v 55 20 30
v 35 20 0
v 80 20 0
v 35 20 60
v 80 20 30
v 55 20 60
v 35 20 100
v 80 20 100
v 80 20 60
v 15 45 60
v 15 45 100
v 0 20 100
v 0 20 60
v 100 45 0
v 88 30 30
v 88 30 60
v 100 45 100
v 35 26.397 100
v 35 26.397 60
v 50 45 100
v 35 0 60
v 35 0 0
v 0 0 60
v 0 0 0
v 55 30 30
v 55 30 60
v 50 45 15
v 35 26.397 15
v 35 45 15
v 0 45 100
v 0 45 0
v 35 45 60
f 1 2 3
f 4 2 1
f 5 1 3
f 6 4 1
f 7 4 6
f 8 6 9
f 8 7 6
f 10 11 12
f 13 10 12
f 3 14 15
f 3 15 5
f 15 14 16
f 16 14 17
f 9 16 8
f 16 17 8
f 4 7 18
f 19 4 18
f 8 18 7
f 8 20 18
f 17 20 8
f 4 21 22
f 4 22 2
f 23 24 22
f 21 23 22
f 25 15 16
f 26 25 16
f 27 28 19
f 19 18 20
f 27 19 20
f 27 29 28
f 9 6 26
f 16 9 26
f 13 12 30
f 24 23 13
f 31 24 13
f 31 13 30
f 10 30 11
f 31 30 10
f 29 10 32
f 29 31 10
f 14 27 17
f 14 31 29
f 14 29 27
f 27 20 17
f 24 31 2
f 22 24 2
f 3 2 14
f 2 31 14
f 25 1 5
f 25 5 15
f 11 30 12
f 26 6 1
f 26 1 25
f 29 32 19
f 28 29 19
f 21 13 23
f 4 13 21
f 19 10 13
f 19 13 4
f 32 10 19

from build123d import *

# Parameters (mm, degrees)
F0_W      = 100
F0_H      = 45
F1_DEPTH  = 100
F2_W      = 65
F2_H      = 20
F3_DEPTH  = 100.001
F6_DEPTH  = 40
F7_W      = 10
F7_H      = 30
F8_DEPTH  = 45
F10_DEPTH = 100.001
F13_DEPTH = 85


with BuildPart() as f1:
    # F0 (on Top) → F1 (new body)
    with BuildSketch(Plane.XY):
        with Locations((50, 22.5)):
            Rectangle(F0_W, F0_H)
    extrude(amount=F1_DEPTH)

    # F2 (on face) → F3 (cut, through all)
    with BuildSketch(Plane.XY.offset(100)):
        with Locations((67.5, 10)):
            Rectangle(F2_W, F2_H)
    extrude(amount=-F3_DEPTH, mode=Mode.SUBTRACT)

    # F5 (on face) → F6 (cut, through all)
    with BuildSketch(Plane.XY.offset(100)):
        Polygon((35, 0), (35, 20), (35, 45), (15, 45), (0, 20), (0, 0), align=None)
    extrude(amount=-F6_DEPTH, mode=Mode.SUBTRACT)

    # F7 (on face) → F8 (cut)
    with BuildSketch(Plane.YZ.offset(100)):
        with Locations((25, 45)):
            Rectangle(F7_W, F7_H)
    extrude(amount=-F8_DEPTH, mode=Mode.SUBTRACT)

    # F9 (on face) → F10 (cut, through all)
    with BuildSketch(Plane.XY.offset(100)):
        Polygon((100, 20), (100, 45), (80, 20), align=None)
    extrude(amount=-F10_DEPTH, mode=Mode.SUBTRACT)

    # F12 (on face) → F13 (cut, through all)
    with BuildSketch(Plane.XY.offset(100)):
        Polygon((50, 45), (35, 45), (35, 26.397135), align=None)
    extrude(amount=-F13_DEPTH, mode=Mode.SUBTRACT)


solid = f1.part
